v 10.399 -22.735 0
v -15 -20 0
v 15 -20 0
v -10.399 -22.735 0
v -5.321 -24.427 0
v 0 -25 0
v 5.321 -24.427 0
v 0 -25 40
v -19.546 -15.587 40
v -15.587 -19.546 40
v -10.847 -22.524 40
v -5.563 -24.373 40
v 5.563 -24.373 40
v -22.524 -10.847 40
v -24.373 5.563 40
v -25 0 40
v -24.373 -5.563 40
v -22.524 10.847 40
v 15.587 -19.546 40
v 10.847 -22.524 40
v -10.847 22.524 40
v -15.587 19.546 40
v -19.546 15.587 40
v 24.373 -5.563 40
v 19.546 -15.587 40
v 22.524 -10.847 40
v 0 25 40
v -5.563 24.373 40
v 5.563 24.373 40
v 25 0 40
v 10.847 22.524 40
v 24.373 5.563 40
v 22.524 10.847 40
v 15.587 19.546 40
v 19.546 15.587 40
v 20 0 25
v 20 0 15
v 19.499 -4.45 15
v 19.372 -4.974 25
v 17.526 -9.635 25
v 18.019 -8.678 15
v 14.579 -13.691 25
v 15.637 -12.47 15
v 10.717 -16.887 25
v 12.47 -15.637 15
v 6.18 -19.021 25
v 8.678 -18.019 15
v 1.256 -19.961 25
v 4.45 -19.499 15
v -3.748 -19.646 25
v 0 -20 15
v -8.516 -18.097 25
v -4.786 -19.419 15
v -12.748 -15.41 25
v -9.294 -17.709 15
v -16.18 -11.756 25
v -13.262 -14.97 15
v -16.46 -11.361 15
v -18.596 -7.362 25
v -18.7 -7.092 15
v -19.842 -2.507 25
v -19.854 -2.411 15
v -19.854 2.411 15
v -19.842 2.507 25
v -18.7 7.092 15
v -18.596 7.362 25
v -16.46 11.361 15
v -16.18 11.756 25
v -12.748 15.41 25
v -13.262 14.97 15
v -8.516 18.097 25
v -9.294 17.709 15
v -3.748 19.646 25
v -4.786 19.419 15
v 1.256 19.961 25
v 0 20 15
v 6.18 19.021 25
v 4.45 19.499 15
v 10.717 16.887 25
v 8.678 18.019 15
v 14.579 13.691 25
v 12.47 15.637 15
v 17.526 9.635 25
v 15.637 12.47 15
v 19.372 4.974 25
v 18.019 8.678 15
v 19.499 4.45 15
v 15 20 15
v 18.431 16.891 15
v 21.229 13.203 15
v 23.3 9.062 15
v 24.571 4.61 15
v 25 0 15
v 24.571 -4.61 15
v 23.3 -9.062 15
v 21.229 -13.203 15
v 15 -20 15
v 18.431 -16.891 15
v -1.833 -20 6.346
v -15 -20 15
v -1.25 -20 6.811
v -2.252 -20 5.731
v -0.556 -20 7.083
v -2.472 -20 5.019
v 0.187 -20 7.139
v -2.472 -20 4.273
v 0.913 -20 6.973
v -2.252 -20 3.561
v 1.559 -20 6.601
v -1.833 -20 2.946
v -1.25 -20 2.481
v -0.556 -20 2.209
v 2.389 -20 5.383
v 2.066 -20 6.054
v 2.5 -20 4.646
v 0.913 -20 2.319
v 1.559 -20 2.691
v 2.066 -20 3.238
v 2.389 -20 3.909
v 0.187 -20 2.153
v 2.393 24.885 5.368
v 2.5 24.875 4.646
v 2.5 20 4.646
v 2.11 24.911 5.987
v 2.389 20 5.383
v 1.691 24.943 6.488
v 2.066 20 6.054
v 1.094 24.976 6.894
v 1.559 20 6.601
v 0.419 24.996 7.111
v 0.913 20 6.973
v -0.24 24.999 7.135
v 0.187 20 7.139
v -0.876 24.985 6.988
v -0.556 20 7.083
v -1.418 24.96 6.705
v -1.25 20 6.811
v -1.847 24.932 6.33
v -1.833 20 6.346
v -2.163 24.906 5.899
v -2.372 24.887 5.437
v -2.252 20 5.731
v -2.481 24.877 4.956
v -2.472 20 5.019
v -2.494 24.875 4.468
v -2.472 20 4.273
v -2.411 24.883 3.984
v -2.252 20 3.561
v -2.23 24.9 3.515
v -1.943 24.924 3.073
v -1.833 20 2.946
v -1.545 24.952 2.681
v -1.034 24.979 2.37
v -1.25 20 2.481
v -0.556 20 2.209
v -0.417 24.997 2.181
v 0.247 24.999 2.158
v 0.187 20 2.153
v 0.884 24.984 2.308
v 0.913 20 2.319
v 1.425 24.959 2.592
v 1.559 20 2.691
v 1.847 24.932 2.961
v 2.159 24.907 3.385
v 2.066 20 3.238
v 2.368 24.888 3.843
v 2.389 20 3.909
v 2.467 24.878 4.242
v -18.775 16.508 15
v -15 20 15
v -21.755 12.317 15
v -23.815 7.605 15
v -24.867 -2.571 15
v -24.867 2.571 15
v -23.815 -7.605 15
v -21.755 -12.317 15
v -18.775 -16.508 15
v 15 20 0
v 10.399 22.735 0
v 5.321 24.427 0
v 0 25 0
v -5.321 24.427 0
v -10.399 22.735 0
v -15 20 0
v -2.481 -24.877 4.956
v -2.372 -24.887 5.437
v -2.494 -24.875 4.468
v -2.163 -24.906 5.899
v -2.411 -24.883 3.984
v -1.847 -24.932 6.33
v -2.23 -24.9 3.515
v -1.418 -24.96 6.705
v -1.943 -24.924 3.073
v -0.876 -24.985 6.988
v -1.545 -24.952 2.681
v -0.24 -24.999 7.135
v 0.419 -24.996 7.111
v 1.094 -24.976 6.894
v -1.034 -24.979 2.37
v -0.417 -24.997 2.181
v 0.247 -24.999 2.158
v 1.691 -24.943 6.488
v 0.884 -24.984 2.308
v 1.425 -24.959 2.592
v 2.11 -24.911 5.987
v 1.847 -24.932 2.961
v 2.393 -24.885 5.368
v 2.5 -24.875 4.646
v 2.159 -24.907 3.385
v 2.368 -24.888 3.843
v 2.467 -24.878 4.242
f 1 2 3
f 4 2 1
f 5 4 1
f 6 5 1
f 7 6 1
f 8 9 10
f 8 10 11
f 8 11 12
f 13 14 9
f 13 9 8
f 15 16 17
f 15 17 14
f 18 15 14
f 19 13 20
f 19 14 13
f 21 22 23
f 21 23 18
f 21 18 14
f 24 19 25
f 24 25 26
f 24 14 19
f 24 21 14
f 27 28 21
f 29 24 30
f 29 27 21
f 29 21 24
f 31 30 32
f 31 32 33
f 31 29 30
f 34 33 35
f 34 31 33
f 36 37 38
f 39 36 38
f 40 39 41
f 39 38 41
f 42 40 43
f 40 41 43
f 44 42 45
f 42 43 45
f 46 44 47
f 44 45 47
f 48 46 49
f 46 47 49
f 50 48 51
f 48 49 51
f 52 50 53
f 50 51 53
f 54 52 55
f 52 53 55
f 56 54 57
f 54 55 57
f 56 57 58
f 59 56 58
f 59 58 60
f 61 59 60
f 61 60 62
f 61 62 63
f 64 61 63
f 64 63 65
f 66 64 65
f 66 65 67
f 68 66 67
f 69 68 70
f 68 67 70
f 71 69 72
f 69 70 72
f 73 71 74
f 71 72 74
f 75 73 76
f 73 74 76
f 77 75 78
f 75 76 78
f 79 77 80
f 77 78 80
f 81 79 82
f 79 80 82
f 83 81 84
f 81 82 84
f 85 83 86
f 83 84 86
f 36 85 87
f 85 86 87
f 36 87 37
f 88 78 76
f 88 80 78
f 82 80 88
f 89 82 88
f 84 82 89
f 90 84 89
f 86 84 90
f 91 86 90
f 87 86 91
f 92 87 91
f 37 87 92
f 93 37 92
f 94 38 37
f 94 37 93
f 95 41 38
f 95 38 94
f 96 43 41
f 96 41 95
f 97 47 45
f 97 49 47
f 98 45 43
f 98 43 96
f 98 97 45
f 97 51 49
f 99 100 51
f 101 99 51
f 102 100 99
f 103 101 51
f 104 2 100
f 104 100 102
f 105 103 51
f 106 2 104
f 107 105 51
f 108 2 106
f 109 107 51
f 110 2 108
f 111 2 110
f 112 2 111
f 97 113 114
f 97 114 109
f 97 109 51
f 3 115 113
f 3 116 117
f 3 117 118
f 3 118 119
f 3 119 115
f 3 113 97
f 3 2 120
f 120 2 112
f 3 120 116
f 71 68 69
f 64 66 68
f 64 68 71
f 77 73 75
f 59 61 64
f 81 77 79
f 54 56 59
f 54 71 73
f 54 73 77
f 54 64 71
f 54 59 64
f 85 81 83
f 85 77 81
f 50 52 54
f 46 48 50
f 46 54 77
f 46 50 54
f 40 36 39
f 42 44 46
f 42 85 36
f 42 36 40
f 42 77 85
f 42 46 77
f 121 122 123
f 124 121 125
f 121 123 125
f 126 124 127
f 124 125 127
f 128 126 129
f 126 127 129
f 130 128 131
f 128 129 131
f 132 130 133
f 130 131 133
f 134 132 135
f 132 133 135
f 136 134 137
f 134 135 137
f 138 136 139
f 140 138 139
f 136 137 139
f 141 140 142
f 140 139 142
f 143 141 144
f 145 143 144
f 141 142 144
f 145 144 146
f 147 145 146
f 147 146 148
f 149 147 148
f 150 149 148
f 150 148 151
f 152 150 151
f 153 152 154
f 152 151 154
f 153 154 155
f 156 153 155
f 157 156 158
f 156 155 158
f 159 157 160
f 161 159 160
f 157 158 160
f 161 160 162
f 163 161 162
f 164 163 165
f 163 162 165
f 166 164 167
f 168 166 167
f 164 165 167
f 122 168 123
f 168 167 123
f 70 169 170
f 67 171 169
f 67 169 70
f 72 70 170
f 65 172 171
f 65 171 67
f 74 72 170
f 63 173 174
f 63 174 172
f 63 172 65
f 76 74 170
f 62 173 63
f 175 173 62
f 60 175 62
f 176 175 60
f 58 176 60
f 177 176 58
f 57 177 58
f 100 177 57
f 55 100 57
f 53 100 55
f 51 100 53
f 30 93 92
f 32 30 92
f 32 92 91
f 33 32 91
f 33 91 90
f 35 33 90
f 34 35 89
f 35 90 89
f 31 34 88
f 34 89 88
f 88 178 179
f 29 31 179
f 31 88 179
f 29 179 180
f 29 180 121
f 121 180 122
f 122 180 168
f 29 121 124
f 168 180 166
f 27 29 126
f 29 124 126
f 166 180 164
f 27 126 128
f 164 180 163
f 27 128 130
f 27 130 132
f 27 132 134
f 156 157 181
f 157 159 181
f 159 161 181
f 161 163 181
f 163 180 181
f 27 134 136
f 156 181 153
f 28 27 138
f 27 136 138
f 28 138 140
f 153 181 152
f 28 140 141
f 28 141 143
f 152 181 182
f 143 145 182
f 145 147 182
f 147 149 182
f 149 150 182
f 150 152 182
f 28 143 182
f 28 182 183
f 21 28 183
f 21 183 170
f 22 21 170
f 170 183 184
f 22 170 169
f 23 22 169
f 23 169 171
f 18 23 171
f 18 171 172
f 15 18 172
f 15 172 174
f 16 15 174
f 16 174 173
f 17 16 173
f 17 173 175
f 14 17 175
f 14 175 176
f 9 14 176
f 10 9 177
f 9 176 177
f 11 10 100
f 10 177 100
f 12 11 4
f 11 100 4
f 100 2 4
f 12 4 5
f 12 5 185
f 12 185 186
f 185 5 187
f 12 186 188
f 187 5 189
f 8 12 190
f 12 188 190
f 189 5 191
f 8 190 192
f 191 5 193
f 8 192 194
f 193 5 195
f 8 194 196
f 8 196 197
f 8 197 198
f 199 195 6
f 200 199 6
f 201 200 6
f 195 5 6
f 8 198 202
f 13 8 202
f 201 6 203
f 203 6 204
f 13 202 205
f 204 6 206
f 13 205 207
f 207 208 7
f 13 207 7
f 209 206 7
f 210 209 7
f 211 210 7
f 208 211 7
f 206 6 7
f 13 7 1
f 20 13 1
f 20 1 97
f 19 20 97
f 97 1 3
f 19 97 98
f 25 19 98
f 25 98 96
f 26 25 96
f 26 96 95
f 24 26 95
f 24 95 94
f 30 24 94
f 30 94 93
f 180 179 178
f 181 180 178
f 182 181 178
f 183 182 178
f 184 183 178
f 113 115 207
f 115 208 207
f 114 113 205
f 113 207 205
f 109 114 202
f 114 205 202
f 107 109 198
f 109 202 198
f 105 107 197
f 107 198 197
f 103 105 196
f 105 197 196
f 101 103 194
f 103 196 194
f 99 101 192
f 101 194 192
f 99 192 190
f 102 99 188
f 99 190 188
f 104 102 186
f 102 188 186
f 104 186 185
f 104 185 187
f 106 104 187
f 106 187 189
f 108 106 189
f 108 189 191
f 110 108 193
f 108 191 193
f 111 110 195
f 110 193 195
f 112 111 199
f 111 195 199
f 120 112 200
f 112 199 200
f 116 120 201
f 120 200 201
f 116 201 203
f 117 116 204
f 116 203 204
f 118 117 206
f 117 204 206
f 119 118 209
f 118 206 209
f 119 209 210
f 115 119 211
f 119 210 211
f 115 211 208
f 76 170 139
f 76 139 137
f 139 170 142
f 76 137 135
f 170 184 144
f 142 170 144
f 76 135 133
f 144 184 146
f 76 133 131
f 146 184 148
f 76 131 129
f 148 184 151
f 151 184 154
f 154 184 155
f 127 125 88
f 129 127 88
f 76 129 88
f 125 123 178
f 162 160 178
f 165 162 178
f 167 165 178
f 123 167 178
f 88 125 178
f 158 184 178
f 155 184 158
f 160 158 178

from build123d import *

# Parameters (mm, degrees)
F0_R     = 25
F1_DEPTH = 40
F2_W     = 67.128714
F2_H     = 40
F3_DEPTH = 15
F4_R     = 20
F5_DEPTH = 10
F6_R     = 2.5
F7_DEPTH = 50


with BuildPart() as f1:
    # F0 (on Top) → F1 (new body)
    with BuildSketch(Plane.XY):
        Circle(F0_R)
    extrude(amount=F1_DEPTH)

    # F2 (on face) → F3 (cut)
    with BuildSketch(Plane(origin=(0, 0, 0), x_dir=(1, 0, 0), z_dir=(0, 0, -1))):
        Rectangle(F2_W, F2_H)
    extrude(amount=-F3_DEPTH, mode=Mode.SUBTRACT)

    # F4 (on face) → F5 (cut)
    with BuildSketch(Plane(origin=(0, 0, 15), x_dir=(1, 0, 0), z_dir=(0, 0, -1))):
        Circle(F4_R)
    extrude(amount=-F5_DEPTH, mode=Mode.SUBTRACT)

    # F6 (on Front) → F7 (cut, symmetric)
    with BuildSketch(Plane.XZ):
        with Locations((0, 4.646019)):
            Circle(F6_R)
    extrude(amount=F7_DEPTH, both=True, mode=Mode.SUBTRACT)


solid = f1.part
